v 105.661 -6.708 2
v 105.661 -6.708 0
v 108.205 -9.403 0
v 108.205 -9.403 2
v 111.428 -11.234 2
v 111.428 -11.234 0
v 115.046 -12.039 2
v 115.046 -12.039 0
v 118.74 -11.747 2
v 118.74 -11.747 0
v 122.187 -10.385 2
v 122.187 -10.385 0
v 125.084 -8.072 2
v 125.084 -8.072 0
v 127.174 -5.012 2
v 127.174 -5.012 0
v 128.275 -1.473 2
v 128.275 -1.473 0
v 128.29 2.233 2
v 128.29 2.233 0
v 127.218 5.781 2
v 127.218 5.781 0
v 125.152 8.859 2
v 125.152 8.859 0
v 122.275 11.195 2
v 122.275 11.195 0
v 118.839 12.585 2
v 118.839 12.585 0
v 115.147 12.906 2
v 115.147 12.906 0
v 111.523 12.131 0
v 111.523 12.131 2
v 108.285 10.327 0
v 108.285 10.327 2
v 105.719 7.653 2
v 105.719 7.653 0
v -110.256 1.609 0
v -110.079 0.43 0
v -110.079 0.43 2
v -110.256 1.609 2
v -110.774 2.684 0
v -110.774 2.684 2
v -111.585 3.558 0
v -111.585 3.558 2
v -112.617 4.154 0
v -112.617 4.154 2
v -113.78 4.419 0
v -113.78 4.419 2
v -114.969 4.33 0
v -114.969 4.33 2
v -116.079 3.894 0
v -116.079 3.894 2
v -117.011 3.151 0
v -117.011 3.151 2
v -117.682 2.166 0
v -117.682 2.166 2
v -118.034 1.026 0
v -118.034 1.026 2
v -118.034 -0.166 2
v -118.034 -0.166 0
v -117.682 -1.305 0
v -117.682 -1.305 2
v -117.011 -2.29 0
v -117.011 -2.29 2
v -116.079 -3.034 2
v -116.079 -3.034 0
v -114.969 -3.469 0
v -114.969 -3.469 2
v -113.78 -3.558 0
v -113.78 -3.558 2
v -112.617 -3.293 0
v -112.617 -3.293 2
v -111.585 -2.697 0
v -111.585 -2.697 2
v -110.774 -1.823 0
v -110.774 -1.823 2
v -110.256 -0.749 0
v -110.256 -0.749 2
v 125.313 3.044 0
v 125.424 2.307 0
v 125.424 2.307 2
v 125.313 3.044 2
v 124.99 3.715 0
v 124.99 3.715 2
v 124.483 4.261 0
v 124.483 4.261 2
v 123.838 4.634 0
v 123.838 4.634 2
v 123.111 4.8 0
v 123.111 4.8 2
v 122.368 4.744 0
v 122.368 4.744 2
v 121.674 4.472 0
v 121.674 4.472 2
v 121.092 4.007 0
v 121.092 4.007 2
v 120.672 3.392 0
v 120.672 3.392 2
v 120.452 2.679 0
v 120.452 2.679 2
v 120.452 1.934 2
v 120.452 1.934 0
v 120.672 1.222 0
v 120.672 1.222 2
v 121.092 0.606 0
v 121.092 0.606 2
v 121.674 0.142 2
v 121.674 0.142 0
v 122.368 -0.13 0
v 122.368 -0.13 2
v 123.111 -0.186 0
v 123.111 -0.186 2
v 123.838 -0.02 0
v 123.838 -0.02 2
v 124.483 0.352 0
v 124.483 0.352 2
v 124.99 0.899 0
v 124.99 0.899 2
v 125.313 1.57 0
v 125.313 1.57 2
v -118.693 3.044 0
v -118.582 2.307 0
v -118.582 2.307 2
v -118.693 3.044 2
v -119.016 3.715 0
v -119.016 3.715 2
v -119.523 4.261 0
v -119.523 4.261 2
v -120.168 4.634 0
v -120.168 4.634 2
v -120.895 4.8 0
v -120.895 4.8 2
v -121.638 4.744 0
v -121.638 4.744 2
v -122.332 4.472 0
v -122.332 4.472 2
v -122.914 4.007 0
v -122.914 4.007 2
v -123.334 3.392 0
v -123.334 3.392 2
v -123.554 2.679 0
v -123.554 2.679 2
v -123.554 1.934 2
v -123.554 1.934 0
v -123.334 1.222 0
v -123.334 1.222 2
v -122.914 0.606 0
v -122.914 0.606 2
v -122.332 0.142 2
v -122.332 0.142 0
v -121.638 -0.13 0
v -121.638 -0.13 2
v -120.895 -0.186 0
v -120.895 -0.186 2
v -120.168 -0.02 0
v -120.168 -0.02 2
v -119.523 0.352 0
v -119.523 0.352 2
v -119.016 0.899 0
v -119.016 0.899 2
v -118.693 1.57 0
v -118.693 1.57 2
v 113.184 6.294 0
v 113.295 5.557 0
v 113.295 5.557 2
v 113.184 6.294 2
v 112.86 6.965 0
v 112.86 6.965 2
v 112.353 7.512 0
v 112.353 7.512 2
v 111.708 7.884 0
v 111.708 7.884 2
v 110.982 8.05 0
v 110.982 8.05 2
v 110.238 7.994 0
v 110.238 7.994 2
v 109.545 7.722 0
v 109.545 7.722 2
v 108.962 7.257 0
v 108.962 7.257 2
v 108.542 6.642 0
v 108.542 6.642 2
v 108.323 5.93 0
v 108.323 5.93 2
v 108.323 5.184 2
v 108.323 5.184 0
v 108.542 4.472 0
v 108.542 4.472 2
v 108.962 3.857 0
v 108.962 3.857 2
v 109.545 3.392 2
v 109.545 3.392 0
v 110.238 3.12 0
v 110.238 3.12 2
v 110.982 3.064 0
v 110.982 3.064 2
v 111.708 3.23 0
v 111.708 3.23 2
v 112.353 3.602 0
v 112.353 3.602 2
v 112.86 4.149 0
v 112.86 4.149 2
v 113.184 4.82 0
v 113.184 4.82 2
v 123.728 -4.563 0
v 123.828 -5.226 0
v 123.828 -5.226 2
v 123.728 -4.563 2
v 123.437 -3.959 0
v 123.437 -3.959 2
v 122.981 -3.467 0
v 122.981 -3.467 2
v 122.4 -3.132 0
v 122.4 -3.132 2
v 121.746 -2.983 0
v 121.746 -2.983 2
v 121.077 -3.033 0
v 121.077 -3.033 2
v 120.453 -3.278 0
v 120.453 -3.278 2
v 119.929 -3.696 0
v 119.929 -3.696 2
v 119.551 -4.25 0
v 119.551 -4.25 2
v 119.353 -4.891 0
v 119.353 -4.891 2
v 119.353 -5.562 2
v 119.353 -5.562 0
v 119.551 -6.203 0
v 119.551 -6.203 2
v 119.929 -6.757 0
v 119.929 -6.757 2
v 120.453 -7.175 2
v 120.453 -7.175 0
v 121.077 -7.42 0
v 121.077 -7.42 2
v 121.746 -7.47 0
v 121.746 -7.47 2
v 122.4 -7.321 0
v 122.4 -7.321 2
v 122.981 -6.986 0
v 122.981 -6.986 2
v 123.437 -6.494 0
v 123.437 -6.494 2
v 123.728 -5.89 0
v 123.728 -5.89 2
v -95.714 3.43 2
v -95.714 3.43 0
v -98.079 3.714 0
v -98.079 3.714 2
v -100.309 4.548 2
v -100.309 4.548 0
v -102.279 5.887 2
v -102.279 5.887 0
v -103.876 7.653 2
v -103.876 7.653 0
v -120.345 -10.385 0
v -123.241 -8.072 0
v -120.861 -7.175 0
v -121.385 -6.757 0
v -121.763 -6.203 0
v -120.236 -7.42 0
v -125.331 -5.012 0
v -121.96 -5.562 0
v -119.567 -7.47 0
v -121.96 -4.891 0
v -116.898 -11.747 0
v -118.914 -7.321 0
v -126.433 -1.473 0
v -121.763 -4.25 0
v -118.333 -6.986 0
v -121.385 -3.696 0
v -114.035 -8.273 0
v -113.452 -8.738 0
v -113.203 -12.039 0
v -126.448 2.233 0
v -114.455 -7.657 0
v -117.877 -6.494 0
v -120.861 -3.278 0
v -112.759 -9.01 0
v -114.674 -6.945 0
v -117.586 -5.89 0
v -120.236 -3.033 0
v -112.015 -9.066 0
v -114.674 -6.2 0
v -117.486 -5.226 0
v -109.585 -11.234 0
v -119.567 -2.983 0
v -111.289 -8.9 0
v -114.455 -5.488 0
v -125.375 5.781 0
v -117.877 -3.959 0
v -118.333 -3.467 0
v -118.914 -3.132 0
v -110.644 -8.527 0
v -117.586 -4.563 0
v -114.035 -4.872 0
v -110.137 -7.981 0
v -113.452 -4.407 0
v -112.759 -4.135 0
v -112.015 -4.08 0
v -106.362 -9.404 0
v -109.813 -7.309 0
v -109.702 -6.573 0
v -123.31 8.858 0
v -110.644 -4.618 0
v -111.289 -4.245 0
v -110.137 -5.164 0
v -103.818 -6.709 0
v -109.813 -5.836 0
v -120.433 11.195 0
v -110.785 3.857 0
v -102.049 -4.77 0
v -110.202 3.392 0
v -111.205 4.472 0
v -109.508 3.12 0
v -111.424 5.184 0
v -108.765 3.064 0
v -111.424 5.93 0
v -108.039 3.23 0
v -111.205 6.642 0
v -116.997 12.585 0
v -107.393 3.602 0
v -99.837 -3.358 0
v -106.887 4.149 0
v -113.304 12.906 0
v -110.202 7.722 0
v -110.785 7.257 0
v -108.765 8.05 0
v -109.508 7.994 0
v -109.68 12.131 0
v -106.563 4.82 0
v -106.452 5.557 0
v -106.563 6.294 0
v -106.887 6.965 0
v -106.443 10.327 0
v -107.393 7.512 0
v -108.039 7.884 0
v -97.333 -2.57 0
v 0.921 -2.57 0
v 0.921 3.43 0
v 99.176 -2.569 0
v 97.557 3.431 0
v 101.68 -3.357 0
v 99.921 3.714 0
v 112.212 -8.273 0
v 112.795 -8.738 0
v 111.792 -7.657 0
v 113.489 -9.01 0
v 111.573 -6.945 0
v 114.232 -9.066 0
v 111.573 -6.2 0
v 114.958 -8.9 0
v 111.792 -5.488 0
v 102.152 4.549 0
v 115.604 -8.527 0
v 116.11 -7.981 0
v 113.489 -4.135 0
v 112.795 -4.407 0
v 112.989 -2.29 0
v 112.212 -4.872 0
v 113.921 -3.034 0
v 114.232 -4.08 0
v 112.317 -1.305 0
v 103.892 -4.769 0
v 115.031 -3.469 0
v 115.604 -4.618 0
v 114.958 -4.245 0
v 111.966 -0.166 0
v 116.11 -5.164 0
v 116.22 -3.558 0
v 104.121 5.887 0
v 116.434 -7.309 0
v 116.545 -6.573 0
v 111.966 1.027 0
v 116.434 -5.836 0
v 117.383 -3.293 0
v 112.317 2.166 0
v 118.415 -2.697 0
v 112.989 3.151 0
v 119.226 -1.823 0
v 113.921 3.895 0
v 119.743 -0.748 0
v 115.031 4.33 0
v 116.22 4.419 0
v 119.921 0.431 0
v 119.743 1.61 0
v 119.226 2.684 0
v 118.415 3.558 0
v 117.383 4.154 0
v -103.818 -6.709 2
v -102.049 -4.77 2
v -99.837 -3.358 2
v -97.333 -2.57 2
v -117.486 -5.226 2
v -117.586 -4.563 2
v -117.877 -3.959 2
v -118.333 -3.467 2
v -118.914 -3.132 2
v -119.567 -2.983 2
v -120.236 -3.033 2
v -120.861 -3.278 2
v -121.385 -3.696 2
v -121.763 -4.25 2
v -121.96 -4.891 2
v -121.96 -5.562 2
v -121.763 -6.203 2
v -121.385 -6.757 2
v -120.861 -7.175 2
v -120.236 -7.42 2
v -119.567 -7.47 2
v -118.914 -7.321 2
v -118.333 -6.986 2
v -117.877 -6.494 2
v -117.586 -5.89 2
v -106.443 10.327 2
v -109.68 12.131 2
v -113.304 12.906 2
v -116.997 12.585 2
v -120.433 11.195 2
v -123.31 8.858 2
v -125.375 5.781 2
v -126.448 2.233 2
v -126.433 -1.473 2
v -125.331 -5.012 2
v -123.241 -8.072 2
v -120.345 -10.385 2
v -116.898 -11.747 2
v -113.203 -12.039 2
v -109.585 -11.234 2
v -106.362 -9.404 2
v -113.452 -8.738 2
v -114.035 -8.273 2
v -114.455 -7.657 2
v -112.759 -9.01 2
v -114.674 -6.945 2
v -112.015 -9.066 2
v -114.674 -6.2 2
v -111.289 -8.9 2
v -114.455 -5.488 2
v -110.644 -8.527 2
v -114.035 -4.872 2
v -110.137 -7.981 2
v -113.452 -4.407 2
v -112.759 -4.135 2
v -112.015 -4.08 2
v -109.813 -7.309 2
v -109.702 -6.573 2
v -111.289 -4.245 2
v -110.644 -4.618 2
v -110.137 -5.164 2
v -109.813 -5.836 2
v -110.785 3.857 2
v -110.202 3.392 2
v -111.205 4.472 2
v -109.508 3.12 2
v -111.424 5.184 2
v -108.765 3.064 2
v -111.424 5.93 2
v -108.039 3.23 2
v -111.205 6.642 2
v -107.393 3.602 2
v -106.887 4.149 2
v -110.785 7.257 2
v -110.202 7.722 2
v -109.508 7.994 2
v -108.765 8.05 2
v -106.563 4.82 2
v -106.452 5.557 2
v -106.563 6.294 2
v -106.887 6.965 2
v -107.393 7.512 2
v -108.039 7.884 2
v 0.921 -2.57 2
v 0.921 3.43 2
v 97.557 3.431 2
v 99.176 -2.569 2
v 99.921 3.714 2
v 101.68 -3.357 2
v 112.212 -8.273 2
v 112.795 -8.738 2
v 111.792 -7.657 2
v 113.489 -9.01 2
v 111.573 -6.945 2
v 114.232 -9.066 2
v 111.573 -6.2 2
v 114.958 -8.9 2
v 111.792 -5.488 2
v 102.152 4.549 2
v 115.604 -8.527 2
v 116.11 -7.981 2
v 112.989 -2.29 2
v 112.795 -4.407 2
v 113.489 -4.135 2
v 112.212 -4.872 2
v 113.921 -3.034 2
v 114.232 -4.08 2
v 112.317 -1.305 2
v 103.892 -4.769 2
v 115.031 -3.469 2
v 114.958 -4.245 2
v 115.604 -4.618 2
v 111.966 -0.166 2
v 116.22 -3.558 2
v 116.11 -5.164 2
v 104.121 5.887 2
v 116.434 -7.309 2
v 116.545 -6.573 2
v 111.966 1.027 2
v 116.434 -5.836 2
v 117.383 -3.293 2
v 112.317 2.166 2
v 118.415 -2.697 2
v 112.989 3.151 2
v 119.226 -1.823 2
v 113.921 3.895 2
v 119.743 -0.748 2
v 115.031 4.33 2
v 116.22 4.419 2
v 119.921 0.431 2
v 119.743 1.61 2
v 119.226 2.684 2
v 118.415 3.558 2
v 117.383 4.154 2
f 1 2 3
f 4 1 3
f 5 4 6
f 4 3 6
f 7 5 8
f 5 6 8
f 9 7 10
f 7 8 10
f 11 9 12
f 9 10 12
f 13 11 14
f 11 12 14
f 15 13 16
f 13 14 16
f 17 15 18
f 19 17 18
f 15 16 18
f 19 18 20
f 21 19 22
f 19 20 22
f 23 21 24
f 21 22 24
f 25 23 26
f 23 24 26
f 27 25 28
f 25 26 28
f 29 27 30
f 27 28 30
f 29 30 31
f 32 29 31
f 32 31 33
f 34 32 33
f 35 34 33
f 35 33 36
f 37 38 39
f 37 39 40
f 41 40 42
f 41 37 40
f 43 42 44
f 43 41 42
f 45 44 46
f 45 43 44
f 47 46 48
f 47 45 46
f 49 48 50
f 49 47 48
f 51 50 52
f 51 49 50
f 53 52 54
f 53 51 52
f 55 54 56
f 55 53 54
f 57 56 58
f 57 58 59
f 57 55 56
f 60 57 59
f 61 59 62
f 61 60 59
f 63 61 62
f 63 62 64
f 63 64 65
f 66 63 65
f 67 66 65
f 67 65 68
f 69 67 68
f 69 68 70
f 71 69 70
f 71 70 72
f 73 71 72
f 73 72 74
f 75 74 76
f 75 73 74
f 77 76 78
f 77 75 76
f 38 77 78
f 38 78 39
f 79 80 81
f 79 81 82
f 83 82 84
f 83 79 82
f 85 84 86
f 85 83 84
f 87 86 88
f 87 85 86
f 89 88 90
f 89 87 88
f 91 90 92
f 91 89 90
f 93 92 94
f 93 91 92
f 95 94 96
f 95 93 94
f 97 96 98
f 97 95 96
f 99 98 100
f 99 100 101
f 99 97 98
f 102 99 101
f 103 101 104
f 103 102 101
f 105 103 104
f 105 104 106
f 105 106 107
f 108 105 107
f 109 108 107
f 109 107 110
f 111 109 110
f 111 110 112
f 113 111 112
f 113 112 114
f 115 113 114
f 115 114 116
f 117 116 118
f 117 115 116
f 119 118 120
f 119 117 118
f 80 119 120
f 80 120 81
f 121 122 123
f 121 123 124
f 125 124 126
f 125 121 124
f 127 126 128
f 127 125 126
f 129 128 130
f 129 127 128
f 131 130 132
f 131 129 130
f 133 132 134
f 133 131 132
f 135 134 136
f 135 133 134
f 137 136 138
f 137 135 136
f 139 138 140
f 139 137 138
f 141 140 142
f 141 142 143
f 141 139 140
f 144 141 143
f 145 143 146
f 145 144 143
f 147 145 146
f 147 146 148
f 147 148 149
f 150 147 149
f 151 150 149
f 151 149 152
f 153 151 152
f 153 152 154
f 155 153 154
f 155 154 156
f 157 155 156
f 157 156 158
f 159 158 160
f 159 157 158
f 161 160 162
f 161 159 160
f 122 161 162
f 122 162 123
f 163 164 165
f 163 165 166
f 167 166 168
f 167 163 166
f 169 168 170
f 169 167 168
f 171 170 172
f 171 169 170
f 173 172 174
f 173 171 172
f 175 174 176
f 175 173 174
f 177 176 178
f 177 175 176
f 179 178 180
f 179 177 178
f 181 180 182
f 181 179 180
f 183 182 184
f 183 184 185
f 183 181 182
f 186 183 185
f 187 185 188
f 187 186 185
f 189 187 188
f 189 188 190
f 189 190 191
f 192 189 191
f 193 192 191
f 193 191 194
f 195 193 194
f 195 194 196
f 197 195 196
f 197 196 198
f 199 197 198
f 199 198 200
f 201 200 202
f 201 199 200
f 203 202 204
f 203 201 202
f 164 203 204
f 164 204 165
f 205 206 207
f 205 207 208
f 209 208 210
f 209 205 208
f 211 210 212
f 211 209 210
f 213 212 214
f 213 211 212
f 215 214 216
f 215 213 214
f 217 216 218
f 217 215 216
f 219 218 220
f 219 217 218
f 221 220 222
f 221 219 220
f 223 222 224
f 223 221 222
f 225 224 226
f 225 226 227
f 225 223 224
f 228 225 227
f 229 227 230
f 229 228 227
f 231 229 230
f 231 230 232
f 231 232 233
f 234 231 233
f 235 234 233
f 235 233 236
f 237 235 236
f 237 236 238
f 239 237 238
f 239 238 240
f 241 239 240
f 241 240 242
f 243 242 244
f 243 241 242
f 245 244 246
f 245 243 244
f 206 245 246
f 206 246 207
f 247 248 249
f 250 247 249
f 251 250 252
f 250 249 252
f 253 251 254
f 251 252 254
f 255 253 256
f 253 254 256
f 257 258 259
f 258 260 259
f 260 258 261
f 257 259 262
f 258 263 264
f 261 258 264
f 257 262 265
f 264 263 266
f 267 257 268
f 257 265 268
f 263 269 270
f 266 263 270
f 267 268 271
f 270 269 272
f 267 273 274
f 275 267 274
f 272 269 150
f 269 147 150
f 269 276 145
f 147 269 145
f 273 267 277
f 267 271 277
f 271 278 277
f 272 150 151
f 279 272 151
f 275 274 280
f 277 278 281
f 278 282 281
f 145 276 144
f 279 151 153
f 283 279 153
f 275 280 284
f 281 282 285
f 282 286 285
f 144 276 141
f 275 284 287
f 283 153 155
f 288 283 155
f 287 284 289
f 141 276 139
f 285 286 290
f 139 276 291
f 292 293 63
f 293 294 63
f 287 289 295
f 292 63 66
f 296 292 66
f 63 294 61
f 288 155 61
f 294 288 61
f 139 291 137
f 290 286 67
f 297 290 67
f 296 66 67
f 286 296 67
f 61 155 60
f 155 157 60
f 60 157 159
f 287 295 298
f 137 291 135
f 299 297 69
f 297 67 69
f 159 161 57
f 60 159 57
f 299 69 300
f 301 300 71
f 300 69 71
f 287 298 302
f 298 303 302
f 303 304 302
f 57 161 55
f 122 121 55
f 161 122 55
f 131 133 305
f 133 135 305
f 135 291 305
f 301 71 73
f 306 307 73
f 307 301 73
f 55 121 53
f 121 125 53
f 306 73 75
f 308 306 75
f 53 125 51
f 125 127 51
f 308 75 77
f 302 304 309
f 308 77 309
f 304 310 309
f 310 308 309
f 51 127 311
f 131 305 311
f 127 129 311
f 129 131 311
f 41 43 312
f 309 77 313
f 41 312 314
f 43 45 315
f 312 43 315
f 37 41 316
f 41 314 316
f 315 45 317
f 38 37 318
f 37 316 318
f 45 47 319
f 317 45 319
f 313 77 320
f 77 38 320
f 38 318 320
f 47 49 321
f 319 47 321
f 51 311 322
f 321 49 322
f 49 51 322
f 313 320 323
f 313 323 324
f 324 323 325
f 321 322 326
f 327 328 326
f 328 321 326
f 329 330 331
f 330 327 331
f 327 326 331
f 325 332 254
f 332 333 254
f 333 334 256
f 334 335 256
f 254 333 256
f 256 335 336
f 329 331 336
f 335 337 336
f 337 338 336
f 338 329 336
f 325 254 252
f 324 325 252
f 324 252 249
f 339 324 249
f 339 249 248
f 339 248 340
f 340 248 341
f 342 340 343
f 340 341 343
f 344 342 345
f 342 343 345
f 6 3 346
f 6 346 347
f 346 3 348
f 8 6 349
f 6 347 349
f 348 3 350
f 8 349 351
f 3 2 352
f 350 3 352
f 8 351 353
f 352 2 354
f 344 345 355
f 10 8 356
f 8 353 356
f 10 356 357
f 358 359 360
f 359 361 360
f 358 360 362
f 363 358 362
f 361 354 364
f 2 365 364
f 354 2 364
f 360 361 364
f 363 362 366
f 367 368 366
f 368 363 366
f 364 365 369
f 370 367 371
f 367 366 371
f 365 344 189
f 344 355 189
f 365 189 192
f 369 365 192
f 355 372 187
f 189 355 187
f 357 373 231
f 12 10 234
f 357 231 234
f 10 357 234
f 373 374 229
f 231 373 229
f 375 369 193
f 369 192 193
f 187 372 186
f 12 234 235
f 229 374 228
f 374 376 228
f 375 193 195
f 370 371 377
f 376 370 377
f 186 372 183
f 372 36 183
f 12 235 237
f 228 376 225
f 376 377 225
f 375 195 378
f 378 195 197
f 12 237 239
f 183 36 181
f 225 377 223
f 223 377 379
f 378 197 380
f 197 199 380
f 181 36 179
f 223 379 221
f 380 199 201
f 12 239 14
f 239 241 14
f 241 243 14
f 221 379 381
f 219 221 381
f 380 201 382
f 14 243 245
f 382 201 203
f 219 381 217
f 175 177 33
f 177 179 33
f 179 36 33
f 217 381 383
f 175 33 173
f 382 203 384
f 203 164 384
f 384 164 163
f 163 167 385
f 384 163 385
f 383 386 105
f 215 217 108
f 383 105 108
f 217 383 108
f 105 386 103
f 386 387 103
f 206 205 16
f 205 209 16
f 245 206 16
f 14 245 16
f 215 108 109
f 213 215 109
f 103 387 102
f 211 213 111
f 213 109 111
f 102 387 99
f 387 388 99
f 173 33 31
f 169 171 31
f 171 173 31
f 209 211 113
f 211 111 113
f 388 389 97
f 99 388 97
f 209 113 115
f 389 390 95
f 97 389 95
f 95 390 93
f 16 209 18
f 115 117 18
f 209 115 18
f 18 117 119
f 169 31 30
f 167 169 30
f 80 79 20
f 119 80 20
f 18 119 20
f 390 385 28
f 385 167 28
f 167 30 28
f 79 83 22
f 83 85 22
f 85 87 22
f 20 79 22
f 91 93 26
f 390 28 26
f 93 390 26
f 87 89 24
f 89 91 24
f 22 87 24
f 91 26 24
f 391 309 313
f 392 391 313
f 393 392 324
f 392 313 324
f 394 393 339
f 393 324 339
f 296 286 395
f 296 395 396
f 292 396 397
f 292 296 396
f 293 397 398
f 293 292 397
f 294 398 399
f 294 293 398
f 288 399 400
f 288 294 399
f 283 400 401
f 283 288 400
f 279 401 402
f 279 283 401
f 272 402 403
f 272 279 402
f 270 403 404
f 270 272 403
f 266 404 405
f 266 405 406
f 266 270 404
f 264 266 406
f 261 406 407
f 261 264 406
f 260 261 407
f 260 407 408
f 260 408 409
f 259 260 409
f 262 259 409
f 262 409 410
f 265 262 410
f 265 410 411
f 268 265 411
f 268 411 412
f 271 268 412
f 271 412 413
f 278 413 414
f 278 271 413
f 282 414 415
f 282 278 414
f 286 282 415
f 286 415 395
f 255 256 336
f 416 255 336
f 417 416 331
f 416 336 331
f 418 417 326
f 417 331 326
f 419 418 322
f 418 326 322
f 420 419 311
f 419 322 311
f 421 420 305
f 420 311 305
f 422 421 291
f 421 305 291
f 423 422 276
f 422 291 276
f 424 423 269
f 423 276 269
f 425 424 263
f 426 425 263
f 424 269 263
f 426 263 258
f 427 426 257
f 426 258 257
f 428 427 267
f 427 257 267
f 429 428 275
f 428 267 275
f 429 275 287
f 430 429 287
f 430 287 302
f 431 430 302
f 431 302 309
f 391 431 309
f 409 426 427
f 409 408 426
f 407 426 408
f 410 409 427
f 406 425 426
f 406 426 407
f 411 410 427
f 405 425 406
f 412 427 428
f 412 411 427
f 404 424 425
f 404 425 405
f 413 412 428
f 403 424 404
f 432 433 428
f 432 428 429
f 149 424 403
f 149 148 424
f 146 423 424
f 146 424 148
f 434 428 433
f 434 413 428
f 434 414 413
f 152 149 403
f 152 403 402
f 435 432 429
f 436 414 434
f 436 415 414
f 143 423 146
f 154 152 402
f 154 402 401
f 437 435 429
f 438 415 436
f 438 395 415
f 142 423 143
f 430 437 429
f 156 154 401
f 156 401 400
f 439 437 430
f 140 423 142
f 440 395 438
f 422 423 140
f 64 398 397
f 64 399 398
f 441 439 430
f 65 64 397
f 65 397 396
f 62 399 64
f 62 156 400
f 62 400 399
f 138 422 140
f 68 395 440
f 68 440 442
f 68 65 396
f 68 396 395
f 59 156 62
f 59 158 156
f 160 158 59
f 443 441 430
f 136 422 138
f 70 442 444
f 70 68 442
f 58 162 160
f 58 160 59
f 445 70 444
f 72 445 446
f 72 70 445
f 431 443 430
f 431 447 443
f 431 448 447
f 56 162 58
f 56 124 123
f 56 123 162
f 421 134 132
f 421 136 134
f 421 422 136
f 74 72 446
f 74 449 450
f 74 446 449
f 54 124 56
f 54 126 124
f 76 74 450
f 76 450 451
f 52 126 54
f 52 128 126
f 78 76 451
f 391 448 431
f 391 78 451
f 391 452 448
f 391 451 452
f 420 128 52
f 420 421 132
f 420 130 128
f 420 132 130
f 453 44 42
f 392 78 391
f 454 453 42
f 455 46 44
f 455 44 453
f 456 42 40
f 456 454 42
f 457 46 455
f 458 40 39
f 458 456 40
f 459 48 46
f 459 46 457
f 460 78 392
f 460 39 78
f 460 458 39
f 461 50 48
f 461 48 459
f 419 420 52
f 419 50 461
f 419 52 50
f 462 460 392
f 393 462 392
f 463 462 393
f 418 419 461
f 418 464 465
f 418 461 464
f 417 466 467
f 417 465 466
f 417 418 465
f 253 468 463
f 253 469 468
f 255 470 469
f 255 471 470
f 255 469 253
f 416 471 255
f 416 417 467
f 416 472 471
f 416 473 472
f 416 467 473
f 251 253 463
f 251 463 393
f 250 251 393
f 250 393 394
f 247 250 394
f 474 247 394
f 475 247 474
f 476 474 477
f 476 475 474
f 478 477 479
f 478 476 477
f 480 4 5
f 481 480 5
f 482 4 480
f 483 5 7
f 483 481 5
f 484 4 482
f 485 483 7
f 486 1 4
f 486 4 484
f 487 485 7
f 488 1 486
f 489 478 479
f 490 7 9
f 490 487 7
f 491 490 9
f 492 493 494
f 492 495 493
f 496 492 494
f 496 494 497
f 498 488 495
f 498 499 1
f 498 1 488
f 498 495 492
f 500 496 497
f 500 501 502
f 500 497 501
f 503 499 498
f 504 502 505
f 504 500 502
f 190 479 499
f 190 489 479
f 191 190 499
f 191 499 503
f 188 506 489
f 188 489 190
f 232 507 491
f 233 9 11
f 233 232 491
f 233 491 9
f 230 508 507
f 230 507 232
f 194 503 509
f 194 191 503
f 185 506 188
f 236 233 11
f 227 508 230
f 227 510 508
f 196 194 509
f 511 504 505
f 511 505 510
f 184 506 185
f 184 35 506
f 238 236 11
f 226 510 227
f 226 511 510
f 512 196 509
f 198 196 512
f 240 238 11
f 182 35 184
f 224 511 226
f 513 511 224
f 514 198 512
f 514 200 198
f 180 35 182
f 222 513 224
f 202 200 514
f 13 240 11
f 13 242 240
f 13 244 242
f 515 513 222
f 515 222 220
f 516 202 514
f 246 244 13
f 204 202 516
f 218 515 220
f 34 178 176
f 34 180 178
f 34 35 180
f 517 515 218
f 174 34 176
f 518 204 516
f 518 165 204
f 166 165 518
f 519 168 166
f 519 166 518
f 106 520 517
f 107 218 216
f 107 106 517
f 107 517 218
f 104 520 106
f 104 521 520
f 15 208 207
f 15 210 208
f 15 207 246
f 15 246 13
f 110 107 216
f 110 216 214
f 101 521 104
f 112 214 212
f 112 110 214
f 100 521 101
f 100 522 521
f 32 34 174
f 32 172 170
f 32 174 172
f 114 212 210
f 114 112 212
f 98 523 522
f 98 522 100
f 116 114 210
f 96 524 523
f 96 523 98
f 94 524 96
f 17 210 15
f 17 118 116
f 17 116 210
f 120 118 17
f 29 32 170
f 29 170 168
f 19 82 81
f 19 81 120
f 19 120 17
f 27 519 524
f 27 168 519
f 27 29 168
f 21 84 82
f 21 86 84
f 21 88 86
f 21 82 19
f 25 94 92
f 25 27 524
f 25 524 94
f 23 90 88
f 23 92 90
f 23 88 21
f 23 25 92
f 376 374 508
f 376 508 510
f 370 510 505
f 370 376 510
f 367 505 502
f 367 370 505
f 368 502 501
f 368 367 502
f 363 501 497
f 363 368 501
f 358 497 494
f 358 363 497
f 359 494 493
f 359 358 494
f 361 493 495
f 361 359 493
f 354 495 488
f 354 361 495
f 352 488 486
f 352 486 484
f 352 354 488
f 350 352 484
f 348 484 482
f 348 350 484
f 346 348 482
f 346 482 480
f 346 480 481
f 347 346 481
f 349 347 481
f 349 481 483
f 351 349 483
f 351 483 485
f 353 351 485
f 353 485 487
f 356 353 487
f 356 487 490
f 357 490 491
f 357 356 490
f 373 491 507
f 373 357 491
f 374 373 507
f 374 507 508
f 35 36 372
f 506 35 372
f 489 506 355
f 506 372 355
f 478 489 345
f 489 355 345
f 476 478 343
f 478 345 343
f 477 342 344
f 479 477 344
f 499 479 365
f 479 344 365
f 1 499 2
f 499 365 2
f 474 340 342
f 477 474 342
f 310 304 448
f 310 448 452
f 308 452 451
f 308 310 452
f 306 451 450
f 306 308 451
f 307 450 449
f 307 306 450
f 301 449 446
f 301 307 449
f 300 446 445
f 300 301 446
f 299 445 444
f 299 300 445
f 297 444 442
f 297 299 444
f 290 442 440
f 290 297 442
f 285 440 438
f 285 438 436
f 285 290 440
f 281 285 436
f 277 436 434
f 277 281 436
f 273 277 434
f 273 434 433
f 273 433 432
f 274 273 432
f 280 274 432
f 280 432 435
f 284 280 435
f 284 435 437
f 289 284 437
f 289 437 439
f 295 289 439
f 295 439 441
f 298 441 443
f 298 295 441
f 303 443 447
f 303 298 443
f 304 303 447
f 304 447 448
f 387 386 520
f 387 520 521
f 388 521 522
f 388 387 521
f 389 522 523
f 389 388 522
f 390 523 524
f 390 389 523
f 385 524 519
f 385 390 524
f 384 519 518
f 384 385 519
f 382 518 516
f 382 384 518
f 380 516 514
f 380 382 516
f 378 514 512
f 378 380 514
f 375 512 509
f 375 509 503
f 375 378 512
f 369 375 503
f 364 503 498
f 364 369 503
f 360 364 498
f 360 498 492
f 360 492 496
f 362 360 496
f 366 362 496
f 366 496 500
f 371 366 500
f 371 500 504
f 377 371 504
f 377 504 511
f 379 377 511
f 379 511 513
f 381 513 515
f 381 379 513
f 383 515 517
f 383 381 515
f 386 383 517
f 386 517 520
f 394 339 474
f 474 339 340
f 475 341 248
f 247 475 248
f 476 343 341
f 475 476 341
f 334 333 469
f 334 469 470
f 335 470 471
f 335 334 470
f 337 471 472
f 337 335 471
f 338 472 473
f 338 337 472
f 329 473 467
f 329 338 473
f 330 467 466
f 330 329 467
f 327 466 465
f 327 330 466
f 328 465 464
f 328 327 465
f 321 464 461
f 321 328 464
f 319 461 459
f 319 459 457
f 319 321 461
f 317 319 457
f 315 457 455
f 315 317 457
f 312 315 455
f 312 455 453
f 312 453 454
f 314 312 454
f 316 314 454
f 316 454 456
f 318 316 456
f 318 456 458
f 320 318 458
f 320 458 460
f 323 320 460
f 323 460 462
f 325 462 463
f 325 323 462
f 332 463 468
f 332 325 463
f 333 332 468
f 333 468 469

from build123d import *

# Parameters (mm, degrees)
SKETCH_1_R      = 2.25
SKETCH_1_R_2    = 2.5
SKETCH_1_R_3    = 4
EXTRUDE_1_DEPTH = 2


with BuildPart() as part:
    # 草图1 → 凸台-拉伸1 (new body)
    with BuildSketch(Plane.XY):
        with BuildLine():
            Line((-97.333495067, -2.569668399), (0.921282848, -2.569581138))
            Line((0.921282848, -2.569581138), (99.176060763, -2.569468011))
            ThreePointArc((99.176060763, -2.569468011), (102.832215453, -3.990464351), (105.660516847, -6.708443184))
            ThreePointArc((105.660516847, -6.708443184), (128.420905518, 0.379743237), (105.718891057, 7.652721898))
            ThreePointArc((105.718891057, 7.652721898), (102.151642887, 4.54858247), (97.556982938, 3.430530125))
            Line((97.556982938, 3.430530125), (0.92127673, 3.430418862))
            Line((0.92127673, 3.430418862), (-95.714429479, 3.430333039))
            ThreePointArc((-95.714429479, 3.430333039), (-100.309091708, 4.548376014), (-103.876346209, 7.652508166))
            ThreePointArc((-103.876346209, 7.652508166), (-126.578345836, 0.379483205), (-103.81794271, -6.708656797))
            ThreePointArc((-103.81794271, -6.708656797), (-100.989646859, -3.990672195), (-97.333495067, -2.569668399))
        make_face()
        with Locations((-119.735572513, -5.226431967)):
            Circle(SKETCH_1_R, mode=Mode.SUBTRACT)
        with Locations((-121.081680504, 2.30686036)):
            Circle(SKETCH_1_R_2, mode=Mode.SUBTRACT)
        with Locations((-108.9521941, 5.556946446)):
            Circle(SKETCH_1_R_2, mode=Mode.SUBTRACT)
        with Locations((-112.202280186, -6.572539958)):
            Circle(SKETCH_1_R_2, mode=Mode.SUBTRACT)
        with Locations((-114.078604371, 0.43031673)):
            Circle(SKETCH_1_R_3, mode=Mode.SUBTRACT)
        with Locations((115.921163949, 0.430551269)):
            Circle(SKETCH_1_R_3, mode=Mode.SUBTRACT)
        with Locations((110.794757573, 5.556946446)):
            Circle(SKETCH_1_R_2, mode=Mode.SUBTRACT)
        with Locations((122.924243977, 2.30686036)):
            Circle(SKETCH_1_R_2, mode=Mode.SUBTRACT)
        with Locations((121.578135986, -5.226431967)):
            Circle(SKETCH_1_R, mode=Mode.SUBTRACT)
        with Locations((114.04484366, -6.572539958)):
            Circle(SKETCH_1_R_2, mode=Mode.SUBTRACT)
    extrude(amount=EXTRUDE_1_DEPTH)


solid = part.part
